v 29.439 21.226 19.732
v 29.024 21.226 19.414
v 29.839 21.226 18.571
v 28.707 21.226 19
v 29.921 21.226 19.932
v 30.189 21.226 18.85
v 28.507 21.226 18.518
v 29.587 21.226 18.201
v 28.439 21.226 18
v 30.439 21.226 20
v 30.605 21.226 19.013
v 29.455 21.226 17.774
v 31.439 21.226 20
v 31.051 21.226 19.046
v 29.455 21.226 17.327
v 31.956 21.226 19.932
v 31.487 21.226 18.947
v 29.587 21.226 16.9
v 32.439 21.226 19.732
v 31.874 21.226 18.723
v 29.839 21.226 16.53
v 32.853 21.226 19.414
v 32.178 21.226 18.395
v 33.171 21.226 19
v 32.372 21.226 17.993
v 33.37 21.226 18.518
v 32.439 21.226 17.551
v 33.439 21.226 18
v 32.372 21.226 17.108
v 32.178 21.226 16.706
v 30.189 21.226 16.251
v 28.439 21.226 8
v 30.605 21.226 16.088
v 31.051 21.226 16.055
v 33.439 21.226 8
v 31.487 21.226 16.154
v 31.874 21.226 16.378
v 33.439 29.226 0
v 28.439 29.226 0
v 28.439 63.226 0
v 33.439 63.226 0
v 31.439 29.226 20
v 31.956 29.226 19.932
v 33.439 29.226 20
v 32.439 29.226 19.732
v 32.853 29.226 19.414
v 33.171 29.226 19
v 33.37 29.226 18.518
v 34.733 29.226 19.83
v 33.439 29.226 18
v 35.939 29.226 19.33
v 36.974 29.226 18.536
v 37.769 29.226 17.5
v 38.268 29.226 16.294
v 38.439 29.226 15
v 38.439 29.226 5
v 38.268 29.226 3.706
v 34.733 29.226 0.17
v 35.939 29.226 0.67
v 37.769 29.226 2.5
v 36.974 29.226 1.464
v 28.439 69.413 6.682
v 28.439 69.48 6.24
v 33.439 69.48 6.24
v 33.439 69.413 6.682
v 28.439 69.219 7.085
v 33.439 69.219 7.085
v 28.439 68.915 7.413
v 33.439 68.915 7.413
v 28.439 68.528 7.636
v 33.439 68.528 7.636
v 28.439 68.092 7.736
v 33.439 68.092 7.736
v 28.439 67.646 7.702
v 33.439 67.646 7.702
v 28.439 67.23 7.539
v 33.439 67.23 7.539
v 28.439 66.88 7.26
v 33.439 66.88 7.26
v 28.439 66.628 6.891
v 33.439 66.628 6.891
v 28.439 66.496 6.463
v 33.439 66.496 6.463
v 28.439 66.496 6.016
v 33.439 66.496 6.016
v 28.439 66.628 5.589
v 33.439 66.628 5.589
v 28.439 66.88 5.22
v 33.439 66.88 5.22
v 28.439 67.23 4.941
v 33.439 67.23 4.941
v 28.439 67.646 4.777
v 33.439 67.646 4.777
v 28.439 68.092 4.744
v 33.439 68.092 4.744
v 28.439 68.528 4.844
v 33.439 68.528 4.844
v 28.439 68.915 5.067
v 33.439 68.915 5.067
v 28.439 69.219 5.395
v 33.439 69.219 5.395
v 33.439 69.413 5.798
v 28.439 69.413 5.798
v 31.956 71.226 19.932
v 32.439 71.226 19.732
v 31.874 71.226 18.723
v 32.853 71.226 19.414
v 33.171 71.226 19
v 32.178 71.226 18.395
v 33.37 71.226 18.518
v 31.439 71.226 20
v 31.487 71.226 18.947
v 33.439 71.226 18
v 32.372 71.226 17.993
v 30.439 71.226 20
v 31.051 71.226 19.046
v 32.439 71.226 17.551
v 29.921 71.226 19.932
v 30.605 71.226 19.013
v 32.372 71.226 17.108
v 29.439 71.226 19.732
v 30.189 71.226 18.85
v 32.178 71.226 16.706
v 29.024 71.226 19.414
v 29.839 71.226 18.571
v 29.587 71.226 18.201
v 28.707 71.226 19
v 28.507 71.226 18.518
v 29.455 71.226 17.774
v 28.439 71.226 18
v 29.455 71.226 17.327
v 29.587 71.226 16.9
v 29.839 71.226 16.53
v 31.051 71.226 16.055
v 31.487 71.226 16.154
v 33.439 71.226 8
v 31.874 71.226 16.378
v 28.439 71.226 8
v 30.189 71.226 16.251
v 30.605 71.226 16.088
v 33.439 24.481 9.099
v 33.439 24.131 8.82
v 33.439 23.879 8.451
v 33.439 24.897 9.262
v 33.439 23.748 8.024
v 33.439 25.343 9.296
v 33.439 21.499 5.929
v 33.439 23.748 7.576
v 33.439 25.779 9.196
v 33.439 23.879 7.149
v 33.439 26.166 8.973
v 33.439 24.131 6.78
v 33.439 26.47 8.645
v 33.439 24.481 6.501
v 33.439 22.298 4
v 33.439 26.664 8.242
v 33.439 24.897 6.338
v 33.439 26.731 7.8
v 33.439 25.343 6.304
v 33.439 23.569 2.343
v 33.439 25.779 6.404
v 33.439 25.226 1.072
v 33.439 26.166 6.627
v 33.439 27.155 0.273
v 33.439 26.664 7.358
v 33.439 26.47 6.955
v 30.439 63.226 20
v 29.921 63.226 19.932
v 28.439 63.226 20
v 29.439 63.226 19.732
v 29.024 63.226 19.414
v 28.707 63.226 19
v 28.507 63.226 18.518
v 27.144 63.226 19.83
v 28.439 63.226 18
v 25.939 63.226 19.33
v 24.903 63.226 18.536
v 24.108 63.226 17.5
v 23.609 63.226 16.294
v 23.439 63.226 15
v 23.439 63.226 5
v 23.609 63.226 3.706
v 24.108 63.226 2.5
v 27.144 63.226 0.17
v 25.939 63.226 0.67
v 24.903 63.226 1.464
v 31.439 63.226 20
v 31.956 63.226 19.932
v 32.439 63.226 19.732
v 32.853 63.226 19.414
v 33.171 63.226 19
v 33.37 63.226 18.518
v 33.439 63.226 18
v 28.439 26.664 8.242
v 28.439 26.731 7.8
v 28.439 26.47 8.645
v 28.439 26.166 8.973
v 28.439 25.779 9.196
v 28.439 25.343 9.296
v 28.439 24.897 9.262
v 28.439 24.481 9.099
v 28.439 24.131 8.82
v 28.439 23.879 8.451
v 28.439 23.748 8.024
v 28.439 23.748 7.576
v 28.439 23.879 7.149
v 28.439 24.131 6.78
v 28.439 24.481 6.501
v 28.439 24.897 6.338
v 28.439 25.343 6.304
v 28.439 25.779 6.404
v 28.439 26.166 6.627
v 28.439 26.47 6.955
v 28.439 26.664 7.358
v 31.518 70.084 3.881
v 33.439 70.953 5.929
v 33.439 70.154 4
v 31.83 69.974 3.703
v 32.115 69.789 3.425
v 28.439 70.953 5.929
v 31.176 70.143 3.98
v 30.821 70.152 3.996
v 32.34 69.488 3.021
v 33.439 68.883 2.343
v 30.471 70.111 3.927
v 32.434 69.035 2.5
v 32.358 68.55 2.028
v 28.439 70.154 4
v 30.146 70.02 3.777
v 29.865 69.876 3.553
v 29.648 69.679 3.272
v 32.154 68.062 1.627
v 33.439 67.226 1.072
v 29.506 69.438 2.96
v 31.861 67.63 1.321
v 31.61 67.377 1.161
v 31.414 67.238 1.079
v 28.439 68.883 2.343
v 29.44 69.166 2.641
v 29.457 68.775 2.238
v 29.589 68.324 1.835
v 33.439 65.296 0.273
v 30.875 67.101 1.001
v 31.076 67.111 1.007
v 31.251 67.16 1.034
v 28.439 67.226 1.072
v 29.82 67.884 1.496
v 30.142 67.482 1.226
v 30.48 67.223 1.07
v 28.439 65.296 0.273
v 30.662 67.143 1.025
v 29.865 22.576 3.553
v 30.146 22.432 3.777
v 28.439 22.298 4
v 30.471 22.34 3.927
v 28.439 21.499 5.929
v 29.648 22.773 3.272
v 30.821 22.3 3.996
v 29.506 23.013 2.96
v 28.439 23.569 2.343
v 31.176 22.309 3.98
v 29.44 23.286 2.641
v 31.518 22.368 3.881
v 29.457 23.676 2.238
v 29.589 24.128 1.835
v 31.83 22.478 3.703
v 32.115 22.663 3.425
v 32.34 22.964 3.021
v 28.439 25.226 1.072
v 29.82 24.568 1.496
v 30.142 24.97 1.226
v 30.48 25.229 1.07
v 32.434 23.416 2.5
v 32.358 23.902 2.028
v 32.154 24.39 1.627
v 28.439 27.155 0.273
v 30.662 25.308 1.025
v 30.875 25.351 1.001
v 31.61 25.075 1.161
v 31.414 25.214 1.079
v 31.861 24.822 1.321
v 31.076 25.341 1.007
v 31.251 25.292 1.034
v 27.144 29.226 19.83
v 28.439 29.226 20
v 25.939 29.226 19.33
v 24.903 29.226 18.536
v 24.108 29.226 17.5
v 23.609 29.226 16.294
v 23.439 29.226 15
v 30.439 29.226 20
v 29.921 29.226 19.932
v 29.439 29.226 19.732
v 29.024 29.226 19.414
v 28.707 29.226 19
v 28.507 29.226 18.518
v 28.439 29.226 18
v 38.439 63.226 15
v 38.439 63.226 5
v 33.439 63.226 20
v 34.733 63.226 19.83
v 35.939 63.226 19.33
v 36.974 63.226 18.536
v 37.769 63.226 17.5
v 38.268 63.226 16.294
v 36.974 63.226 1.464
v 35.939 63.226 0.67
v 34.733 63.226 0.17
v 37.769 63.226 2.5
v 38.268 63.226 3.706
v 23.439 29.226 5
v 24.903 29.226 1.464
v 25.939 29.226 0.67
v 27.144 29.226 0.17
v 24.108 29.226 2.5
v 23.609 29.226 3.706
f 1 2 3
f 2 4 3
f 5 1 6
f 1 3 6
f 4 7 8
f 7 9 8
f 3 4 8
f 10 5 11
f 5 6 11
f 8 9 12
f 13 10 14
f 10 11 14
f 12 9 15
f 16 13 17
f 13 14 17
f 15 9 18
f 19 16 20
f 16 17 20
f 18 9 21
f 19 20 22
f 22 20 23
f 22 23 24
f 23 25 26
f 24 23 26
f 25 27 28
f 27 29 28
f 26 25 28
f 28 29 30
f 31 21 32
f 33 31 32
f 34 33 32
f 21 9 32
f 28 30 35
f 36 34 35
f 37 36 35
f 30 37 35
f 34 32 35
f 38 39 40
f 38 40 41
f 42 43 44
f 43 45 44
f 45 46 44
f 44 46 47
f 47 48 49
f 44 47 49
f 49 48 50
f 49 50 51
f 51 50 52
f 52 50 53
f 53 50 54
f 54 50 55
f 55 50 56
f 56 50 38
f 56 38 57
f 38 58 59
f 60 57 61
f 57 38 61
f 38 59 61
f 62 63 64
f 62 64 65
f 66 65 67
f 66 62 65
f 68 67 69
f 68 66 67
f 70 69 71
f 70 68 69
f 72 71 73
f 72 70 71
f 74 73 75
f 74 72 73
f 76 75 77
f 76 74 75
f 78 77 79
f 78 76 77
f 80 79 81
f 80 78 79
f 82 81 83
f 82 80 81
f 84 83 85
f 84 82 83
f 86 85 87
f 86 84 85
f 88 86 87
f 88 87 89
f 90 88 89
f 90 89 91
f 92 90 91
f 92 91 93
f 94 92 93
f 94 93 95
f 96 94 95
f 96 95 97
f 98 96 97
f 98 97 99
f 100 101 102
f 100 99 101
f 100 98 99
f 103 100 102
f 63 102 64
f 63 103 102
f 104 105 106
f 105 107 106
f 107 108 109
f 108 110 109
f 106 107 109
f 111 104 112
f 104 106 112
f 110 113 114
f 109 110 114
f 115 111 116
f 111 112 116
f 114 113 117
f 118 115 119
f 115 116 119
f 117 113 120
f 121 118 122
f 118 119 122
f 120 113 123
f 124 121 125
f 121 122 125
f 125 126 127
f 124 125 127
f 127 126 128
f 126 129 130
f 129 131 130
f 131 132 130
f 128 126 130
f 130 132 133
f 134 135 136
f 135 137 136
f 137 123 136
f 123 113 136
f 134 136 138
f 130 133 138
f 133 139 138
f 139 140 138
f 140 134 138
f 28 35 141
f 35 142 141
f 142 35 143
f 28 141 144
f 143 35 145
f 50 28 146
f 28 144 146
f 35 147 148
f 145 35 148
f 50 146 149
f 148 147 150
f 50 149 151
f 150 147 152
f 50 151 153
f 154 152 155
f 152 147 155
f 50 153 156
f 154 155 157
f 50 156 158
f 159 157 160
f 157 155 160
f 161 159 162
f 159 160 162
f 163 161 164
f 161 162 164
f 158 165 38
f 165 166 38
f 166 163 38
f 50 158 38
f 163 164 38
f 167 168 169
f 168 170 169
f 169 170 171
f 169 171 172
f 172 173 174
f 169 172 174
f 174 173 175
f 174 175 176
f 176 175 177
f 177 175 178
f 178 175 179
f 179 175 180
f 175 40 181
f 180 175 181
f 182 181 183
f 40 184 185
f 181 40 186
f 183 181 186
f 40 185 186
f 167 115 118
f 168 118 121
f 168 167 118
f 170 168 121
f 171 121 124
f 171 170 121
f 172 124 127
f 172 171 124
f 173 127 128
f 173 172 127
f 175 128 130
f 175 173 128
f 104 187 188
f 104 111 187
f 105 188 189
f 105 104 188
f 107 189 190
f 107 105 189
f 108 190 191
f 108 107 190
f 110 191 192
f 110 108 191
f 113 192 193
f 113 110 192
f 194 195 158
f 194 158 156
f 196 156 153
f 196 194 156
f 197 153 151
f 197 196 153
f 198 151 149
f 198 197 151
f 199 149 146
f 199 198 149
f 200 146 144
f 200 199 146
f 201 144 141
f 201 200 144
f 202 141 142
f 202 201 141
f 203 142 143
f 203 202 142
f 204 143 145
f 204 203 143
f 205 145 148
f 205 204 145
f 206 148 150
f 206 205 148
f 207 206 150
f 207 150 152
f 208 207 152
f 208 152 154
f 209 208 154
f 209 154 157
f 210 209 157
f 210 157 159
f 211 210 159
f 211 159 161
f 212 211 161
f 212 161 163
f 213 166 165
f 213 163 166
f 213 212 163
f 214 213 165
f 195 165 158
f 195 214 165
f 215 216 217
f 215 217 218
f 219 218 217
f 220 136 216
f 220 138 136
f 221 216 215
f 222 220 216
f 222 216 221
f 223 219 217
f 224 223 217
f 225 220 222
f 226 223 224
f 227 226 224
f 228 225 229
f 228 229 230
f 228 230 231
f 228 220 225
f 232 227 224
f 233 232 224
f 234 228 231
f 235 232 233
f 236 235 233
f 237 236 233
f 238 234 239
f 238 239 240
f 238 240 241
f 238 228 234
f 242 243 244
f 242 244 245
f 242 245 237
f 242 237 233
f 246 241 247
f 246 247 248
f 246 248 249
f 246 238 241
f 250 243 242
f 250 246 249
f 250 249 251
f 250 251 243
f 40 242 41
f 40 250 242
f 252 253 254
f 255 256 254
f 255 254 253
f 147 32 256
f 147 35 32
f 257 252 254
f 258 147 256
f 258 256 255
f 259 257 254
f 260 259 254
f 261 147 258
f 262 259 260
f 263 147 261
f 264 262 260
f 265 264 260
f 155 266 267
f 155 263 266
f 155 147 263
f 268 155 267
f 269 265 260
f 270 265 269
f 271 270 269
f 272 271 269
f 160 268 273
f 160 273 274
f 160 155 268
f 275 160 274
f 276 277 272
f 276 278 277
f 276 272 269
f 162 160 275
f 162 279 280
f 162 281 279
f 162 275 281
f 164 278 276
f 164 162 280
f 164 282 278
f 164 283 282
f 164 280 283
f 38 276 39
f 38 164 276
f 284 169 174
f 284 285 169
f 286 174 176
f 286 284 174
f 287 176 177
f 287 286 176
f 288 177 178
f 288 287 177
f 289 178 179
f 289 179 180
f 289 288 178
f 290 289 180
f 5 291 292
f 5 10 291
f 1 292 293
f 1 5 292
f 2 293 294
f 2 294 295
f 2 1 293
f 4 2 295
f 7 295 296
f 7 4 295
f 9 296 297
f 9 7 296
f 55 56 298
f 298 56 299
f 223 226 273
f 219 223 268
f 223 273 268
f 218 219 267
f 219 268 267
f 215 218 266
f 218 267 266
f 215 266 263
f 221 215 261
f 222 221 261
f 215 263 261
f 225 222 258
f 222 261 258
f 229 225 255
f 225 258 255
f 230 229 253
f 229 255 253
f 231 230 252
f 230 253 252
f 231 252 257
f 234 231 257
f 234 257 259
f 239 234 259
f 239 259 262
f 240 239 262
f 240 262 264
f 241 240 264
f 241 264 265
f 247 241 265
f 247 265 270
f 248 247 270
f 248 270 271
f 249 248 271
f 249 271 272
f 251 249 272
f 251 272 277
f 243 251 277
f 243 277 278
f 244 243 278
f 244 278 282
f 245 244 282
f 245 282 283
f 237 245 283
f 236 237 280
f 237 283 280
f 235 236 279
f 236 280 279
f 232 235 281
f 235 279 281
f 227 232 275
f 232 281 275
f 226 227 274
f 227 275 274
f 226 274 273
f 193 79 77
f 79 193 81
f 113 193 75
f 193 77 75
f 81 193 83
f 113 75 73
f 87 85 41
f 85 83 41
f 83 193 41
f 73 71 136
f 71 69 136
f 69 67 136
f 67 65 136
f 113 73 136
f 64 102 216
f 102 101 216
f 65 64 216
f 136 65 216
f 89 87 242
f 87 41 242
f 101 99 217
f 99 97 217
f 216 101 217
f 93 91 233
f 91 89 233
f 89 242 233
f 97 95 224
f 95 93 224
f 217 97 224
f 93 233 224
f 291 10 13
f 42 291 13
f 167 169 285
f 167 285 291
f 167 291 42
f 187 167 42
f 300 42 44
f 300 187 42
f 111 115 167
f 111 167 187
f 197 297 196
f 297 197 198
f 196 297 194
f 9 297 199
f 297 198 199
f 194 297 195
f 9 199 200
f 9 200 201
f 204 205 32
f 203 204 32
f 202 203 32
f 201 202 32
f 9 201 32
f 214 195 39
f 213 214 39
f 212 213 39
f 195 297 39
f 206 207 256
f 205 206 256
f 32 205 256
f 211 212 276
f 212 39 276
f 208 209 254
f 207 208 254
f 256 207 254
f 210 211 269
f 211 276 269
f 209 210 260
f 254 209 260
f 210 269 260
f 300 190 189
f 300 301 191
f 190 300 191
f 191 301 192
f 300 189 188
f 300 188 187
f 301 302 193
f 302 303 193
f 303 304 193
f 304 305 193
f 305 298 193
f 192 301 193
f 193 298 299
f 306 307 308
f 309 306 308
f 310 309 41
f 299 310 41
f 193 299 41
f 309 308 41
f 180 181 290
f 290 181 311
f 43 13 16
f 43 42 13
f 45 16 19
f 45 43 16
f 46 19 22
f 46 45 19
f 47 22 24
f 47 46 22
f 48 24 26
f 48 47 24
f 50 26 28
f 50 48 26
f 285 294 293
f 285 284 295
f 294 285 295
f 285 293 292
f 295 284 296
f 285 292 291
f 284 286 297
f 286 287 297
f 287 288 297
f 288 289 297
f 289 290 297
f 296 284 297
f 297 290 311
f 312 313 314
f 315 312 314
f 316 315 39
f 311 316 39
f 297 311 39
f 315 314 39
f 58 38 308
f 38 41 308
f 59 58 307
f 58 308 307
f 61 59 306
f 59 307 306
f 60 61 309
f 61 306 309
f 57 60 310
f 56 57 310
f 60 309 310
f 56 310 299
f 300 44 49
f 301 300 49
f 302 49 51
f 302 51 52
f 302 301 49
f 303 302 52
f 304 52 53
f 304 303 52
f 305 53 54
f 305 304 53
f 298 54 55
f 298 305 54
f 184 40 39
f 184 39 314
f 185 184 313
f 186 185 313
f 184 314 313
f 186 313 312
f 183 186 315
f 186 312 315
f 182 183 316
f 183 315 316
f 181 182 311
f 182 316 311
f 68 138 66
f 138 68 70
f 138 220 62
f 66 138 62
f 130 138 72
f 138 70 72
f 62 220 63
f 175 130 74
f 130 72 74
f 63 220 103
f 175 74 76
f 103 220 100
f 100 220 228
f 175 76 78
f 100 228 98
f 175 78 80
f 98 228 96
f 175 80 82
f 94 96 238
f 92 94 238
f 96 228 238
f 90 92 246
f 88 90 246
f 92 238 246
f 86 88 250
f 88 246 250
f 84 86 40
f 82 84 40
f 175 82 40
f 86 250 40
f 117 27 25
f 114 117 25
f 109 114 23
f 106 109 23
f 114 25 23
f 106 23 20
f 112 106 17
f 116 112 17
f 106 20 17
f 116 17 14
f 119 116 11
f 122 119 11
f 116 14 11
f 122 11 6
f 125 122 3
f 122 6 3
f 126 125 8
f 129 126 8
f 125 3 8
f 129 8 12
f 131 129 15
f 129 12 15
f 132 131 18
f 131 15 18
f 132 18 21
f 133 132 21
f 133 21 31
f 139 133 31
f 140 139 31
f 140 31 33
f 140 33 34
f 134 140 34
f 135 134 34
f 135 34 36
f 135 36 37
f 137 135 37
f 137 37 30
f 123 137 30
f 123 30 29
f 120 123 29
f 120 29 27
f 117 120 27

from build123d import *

# Parameters (mm, degrees)
F1_DEPTH = 20
F2_R     = 8
F3_R     = 5
F4_R     = 2
F5_R     = 1.5
F6_DEPTH = 50
F7_R     = 1.5
F8_DEPTH = 82.9


with BuildPart() as f1:
    # F0 (on Top) → F1 (new body)
    with BuildSketch(Plane.XY):
        Polygon((33.438562, 71.225935), (28.438562, 71.225935), (28.438562, 63.225935), (23.438562, 63.225935), (23.438562, 29.225935), (28.438562, 29.225935), (28.438562, 21.225935), (33.438562, 21.225935), (33.438562, 29.225935), (38.438562, 29.225935), (38.438562, 63.225935), (33.438562, 63.225935), align=None)
    extrude(amount=F1_DEPTH)

    # F2
    f2_edges = [f1.edges().sort_by_distance(p)[0] for p in [
        (30.938562, 21.225935, 0),
        (30.938562, 71.225935, 0),
    ]]
    fillet(f2_edges, radius=F2_R)

    # F3
    f3_edges = [f1.edges().sort_by_distance(p)[0] for p in [
        (38.438562, 46.225935, 20),
        (23.438562, 46.225935, 20),
        (38.438562, 46.225935, 0),
        (23.438562, 46.225935, 0),
    ]]
    fillet(f3_edges, radius=F3_R)

    # F4
    f4_edges = [f1.edges().sort_by_distance(p)[0] for p in [
        (33.438562, 25.225935, 20),
        (33.438562, 67.225935, 20),
        (28.438562, 67.225935, 20),
        (28.438562, 25.225935, 20),
    ]]
    fillet(f4_edges, radius=F4_R)

    # F5 (on Right) → F6 (cut)
    with BuildSketch(Plane.YZ):
        with Locations((67.979599, 6.239843)):
            Circle(F5_R)
        with Locations((25.230938, 7.8)):
            Circle(F5_R)
    extrude(amount=F6_DEPTH, mode=Mode.SUBTRACT)

    # F7 (on Front) → F8 (cut)
    with BuildSketch(Plane.XZ):
        with Locations((30.938562, 17.55051)):
            Circle(F7_R)
        with Locations((30.933637, 2.5)):
            Circle(F7_R)
    extrude(amount=-F8_DEPTH, mode=Mode.SUBTRACT)


solid = f1.part
